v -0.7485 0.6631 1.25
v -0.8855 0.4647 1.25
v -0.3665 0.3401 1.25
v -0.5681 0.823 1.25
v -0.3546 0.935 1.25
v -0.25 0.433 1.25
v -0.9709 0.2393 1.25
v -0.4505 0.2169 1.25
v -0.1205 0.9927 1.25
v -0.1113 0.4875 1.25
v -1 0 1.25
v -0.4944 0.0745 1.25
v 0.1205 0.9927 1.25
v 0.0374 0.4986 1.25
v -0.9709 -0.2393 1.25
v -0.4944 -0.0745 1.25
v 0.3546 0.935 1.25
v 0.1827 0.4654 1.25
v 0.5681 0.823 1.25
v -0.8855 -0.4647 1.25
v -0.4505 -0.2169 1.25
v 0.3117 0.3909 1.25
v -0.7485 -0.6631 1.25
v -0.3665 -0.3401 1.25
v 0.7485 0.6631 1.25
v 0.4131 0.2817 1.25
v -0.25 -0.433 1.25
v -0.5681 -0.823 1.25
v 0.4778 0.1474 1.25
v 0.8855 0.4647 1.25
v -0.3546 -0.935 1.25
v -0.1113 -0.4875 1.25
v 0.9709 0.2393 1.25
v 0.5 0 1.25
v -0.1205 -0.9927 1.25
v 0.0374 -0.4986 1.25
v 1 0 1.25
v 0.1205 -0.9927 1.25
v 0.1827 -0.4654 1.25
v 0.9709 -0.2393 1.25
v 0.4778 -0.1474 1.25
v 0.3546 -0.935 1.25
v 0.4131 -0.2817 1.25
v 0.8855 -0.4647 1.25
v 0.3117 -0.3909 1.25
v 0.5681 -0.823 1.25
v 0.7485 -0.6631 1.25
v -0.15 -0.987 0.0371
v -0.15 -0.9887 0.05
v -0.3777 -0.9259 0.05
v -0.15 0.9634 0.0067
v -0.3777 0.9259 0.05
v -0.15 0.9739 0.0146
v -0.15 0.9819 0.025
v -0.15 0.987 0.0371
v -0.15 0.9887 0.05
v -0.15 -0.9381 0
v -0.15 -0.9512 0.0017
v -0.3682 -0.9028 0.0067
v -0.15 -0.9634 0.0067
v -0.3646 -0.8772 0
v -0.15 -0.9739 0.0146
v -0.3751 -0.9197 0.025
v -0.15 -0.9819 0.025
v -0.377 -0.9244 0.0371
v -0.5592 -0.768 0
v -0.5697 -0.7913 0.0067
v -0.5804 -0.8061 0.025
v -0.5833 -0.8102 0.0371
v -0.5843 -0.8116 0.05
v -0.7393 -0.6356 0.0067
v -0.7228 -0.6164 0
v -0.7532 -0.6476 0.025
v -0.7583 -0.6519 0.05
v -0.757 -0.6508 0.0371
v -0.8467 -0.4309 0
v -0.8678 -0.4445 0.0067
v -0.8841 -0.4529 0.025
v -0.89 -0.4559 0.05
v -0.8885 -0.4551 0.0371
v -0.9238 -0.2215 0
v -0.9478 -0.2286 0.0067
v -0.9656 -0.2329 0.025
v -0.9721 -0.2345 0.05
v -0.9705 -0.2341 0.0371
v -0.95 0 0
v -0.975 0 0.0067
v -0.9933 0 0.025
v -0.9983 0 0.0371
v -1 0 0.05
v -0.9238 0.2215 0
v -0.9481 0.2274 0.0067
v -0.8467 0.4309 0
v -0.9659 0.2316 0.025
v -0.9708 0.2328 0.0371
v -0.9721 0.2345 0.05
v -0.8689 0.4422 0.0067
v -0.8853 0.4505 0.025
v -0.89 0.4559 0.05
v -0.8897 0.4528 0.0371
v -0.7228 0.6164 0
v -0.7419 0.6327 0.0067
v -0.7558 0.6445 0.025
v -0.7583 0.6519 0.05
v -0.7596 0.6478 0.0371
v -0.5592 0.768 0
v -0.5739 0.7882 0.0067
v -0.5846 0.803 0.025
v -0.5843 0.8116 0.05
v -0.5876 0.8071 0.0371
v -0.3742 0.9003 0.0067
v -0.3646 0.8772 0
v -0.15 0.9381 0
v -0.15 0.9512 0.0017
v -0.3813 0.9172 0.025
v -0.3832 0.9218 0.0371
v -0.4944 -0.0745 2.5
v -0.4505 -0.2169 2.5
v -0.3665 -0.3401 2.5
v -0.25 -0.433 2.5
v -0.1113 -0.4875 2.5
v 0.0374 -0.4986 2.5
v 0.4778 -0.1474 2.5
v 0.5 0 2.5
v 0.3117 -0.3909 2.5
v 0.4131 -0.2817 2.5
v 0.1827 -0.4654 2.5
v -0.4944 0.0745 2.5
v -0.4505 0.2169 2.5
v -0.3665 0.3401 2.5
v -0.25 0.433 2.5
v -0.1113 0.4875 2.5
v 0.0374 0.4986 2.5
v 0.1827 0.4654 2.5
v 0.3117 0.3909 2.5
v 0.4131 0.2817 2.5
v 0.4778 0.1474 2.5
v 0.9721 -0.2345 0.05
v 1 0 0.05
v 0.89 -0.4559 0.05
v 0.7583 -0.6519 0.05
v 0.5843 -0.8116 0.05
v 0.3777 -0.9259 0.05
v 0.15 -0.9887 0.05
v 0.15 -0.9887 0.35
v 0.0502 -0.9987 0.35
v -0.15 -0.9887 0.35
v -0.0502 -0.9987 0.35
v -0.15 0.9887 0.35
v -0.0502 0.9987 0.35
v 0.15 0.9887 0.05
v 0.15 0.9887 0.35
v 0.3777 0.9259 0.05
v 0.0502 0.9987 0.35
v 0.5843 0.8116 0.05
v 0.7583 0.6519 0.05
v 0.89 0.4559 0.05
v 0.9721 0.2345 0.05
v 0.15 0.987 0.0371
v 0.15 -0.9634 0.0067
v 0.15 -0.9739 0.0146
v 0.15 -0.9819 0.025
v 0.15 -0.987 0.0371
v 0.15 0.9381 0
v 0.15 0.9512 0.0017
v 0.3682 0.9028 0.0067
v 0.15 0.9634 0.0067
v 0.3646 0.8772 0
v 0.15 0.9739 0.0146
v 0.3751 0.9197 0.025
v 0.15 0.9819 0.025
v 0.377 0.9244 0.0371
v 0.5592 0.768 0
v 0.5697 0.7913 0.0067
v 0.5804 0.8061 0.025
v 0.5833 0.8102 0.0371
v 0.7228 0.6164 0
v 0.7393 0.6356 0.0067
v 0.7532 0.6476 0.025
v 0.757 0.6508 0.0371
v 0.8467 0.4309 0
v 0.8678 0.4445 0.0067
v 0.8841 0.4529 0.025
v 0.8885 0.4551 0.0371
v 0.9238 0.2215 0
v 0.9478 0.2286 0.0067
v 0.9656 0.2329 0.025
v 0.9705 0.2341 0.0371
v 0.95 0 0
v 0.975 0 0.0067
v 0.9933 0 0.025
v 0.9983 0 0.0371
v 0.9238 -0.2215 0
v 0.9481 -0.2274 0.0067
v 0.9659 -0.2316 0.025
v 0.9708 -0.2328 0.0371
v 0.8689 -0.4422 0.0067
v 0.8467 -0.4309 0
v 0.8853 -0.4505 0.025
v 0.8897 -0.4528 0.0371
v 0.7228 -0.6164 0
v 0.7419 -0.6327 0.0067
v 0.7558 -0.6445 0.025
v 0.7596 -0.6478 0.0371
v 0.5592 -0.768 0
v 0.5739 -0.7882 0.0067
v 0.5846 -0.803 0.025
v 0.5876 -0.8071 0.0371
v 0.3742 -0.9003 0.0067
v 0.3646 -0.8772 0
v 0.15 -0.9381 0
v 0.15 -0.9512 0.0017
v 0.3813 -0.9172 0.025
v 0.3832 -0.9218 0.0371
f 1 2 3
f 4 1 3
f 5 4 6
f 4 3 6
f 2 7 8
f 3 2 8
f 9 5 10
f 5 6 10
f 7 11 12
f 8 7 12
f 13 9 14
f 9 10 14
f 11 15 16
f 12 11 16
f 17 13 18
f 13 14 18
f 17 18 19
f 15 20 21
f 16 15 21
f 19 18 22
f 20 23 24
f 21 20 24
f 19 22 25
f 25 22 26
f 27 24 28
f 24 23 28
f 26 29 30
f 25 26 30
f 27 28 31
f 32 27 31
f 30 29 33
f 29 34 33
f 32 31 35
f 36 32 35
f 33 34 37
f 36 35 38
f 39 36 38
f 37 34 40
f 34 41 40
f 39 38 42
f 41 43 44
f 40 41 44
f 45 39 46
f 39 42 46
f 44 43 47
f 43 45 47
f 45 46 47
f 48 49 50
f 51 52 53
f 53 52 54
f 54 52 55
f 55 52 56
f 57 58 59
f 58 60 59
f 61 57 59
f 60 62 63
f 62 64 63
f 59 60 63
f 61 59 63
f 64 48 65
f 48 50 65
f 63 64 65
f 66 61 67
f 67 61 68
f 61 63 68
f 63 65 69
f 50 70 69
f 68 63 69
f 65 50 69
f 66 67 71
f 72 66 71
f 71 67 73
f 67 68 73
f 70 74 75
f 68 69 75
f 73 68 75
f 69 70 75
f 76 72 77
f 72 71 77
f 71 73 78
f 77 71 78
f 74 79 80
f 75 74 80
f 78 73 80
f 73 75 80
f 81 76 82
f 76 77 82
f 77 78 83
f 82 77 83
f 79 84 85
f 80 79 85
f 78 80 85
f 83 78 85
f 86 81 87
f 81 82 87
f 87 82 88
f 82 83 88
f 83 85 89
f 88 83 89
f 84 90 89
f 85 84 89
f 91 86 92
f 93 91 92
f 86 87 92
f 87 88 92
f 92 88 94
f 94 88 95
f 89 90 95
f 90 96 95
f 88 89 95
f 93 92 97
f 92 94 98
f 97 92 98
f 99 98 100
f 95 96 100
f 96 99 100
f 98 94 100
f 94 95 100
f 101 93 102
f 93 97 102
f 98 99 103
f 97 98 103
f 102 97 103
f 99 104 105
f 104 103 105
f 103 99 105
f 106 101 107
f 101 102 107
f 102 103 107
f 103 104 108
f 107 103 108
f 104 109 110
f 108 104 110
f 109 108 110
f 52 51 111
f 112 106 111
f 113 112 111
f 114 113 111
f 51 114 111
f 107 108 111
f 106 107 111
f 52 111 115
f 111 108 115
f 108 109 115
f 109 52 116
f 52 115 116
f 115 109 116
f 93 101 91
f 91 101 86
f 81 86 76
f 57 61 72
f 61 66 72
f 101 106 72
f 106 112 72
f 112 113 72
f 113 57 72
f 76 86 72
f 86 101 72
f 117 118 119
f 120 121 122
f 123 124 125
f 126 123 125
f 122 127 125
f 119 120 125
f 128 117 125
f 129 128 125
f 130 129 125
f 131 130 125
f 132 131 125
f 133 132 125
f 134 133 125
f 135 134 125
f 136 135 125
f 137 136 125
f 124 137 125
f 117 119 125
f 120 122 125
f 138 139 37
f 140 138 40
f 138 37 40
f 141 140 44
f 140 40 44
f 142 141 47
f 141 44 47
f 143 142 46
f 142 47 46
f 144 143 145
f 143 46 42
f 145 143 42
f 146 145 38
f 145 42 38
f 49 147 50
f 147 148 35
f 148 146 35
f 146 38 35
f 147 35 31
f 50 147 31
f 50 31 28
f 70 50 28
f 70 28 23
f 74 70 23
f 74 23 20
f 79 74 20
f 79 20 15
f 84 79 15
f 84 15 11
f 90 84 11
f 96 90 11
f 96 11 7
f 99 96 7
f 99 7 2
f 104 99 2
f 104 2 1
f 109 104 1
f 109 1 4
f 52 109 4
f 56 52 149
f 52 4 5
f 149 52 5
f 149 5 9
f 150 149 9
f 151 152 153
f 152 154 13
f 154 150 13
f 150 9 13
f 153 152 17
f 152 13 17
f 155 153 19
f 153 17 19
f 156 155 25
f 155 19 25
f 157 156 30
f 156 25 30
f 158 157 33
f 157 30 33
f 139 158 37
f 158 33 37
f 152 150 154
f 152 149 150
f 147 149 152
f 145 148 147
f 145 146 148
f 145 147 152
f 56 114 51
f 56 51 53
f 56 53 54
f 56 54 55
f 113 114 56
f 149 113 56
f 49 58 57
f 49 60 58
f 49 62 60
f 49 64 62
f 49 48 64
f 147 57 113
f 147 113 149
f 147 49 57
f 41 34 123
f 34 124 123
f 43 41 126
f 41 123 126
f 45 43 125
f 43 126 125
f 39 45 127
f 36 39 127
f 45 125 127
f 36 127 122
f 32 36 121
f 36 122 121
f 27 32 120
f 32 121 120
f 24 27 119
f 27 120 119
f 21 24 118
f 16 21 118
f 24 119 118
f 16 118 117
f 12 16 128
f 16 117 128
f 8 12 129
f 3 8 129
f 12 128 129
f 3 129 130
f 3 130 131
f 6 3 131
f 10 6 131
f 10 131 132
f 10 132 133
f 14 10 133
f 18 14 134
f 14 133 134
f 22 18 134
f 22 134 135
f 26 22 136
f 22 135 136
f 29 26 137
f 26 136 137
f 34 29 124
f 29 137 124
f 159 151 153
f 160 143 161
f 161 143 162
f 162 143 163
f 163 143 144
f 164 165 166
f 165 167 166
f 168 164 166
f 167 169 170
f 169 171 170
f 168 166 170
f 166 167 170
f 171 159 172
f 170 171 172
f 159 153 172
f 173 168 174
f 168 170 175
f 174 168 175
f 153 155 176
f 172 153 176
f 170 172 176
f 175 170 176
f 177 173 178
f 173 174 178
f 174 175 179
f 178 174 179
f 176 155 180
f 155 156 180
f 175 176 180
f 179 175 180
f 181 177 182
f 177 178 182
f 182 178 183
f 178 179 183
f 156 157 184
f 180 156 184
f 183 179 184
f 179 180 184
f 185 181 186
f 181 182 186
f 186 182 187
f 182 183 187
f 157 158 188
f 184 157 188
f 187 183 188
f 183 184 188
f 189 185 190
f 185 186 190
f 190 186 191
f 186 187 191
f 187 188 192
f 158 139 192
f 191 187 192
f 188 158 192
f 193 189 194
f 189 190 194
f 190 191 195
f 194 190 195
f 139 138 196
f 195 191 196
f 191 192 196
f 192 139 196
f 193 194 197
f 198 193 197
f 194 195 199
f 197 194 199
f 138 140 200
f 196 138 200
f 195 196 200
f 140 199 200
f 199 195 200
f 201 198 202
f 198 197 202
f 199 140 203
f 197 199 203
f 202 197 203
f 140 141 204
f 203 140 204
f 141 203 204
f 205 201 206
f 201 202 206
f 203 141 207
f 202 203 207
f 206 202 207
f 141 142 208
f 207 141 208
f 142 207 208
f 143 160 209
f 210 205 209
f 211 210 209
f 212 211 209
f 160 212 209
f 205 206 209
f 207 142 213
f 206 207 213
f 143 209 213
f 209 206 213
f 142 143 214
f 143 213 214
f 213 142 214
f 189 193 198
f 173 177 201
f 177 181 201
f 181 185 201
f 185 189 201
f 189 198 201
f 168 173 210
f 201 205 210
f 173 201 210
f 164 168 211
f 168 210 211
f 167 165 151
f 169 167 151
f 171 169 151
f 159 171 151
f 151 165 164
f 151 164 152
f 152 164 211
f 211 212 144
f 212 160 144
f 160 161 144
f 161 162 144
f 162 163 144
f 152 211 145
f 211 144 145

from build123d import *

# Parameters (mm, degrees)
F2_R     = 0.05
F3_W     = 0.3
F3_H     = 0.35
F4_DEPTH = 12.5


with BuildPart() as f1:
    # F0 (on Front) → F1 (revolve)
    with BuildSketch(Plane.XZ):
        Polygon((0, 2.5), (0, 0), (1, 0), (1, 1.25), (0.5, 1.25), (0.5, 2.5), align=None)
    revolve(axis=Axis((0, 0, 1.25), (0, 0, -1)))

    # F2
    f2_edges = [f1.edges().sort_by_distance(p)[0] for p in [
        (-1, 0, 0),
    ]]
    fillet(f2_edges, radius=F2_R)

    # F3 (on Front) → F4 (cut, symmetric)
    with BuildSketch(Plane.XZ):
        with Locations((0, 0.175)):
            Rectangle(F3_W, F3_H)
    extrude(amount=F4_DEPTH, both=True, mode=Mode.SUBTRACT)


solid = f1.part
